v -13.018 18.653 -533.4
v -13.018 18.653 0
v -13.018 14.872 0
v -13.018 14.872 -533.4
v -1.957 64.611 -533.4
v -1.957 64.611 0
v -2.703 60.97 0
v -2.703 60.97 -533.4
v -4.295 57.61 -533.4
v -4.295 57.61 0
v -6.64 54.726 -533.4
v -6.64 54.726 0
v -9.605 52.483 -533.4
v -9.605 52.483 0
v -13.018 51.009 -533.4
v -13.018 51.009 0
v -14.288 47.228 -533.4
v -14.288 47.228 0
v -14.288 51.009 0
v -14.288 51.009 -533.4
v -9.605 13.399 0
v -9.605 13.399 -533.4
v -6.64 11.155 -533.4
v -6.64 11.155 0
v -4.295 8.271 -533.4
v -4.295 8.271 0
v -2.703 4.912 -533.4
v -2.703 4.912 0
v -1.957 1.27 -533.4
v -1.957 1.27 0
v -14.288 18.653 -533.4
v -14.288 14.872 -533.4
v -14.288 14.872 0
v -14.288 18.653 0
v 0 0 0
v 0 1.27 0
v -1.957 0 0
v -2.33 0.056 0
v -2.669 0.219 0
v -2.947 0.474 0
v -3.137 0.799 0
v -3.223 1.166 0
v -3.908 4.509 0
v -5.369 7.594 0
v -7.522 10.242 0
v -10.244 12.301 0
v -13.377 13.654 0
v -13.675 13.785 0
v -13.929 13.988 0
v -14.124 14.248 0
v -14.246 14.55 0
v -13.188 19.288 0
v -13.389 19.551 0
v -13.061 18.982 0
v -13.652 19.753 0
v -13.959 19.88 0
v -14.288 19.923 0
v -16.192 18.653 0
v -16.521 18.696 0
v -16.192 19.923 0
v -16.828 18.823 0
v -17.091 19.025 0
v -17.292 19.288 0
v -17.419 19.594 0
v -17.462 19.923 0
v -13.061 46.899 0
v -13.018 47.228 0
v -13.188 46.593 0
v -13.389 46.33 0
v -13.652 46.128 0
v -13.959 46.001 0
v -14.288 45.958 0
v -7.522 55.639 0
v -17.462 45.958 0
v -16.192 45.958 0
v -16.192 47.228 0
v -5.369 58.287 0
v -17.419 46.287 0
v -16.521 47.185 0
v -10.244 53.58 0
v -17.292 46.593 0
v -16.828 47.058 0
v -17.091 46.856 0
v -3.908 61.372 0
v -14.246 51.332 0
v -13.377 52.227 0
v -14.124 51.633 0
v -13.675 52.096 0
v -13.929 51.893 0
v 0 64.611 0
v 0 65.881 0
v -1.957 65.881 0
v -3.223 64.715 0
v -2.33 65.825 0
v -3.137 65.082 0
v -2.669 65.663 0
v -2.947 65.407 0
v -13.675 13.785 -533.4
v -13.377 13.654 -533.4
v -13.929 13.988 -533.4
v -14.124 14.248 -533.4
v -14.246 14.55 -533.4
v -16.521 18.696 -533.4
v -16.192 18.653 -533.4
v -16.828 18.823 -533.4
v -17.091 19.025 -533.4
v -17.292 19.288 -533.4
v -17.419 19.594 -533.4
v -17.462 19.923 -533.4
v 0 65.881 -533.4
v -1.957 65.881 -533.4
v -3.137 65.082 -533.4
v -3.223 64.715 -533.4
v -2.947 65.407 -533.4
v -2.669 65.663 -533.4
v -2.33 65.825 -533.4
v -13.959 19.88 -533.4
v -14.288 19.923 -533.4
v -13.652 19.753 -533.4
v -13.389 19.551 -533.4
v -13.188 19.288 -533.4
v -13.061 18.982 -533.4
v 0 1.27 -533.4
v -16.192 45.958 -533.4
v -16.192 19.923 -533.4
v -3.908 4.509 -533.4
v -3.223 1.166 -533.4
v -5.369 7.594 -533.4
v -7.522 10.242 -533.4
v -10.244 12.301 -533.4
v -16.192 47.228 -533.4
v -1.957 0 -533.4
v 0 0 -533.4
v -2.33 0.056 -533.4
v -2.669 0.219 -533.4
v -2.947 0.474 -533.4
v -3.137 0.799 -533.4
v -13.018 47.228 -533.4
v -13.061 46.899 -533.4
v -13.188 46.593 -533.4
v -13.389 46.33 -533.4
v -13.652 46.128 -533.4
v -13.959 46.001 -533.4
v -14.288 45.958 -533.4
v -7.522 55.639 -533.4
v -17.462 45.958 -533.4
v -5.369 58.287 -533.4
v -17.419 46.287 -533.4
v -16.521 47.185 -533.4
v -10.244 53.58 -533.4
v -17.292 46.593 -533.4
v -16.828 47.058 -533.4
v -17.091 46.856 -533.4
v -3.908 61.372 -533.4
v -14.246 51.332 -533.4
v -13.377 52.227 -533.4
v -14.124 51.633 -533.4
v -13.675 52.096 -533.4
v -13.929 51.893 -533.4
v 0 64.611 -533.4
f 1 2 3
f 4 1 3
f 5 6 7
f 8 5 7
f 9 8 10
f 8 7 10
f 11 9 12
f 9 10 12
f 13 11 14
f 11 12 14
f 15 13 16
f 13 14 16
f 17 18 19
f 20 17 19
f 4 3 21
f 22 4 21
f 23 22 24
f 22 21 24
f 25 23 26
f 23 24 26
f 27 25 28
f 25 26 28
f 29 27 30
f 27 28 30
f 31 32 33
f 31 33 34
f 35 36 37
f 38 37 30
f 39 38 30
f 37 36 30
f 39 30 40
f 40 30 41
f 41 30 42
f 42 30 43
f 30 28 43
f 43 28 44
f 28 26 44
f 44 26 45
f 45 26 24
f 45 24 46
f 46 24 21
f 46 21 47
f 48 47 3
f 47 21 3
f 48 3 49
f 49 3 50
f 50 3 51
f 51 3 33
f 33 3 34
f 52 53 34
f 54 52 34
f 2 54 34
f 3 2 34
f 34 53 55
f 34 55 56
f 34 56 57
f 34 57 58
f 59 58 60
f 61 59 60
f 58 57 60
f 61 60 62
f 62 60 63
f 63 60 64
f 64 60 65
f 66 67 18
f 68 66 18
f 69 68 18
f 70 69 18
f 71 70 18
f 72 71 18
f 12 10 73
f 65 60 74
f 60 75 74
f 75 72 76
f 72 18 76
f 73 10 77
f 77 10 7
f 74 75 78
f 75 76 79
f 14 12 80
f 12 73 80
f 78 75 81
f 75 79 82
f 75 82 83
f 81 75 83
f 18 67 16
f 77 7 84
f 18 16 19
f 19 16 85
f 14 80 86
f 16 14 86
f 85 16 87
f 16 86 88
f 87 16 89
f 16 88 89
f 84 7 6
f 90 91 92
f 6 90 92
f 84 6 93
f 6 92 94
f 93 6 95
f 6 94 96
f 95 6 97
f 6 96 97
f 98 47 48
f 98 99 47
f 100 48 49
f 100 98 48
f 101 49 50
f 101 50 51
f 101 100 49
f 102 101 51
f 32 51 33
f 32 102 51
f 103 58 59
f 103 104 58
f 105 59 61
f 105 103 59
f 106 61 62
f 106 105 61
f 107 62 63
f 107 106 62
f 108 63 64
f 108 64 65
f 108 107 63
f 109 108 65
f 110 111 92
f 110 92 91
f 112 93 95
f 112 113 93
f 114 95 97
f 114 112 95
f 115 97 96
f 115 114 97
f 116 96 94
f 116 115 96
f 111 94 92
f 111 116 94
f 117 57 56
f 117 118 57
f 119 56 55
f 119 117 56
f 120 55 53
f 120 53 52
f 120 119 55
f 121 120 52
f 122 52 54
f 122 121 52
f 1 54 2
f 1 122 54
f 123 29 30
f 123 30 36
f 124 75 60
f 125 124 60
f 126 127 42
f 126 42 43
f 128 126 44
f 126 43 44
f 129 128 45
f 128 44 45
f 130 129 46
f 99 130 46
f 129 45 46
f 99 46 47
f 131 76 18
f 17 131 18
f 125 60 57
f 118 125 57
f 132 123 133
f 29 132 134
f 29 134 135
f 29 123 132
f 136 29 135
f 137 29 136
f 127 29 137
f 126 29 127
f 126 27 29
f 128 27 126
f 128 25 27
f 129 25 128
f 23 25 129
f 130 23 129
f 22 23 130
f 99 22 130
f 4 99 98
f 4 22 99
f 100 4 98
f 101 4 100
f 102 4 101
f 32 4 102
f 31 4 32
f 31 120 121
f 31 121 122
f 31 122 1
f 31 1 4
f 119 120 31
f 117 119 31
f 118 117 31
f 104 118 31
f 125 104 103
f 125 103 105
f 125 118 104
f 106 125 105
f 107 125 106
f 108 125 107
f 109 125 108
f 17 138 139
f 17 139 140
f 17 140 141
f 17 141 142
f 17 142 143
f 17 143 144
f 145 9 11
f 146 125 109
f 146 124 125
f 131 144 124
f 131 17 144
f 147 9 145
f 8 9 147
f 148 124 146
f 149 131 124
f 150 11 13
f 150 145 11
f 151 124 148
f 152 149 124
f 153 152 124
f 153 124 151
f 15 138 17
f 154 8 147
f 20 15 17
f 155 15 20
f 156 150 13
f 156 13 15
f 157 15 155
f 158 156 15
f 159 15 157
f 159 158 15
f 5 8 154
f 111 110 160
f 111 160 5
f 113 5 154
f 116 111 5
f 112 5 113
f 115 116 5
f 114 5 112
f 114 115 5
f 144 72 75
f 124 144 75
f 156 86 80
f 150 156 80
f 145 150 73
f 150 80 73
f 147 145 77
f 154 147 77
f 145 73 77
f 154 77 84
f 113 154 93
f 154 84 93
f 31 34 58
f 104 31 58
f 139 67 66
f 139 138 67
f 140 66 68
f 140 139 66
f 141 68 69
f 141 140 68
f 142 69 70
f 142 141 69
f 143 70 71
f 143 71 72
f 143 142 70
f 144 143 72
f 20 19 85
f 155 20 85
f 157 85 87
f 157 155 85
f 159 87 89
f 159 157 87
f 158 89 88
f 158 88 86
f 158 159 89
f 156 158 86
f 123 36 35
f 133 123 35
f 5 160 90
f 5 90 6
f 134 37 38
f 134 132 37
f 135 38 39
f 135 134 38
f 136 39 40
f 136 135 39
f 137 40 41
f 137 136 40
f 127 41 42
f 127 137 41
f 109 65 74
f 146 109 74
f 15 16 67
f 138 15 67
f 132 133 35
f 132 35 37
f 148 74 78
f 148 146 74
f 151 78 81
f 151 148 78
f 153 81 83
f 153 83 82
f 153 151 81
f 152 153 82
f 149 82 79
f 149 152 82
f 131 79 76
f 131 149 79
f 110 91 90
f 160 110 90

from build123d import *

# Parameters (mm, degrees)
EXTRUDE_THIN1_DEPTH = 533.4
FILLET1_R           = 1.27


with BuildPart() as part:
    # Sketch1 → Extrude-Thin1 (new body)
    with BuildSketch(Plane.XY):
        with BuildLine():
            Line((0, 0), (-3.175, 0))
            ThreePointArc((-3.175, 0), (-6.294965924, 8.894339761), (-14.2875, 13.890625))
            Line((-14.2875, 13.890625), (-14.2875, 18.653125))
            Line((-14.2875, 18.653125), (-17.4625, 18.653125))
            Line((-17.4625, 18.653125), (-17.4625, 47.228125))
            Line((-17.4625, 47.228125), (-14.2875, 47.228125))
            Line((-14.2875, 47.228125), (-14.2875, 51.990625))
            ThreePointArc((-14.2875, 51.990625), (-6.294965924, 56.986910239), (-3.175, 65.88125))
            Line((-3.175, 65.88125), (0, 65.88125))
            Line((0, 65.88125), (0, 64.61125))
            Line((0, 64.61125), (-1.957090043, 64.61125))
            ThreePointArc((-1.957090043, 64.61125), (-5.380817599, 56.097391338), (-13.0175, 51.009289373))
            Line((-13.0175, 51.009289373), (-13.0175, 45.958125))
            Line((-13.0175, 45.958125), (-16.1925, 45.958125))
            Line((-16.1925, 45.958125), (-16.1925, 19.923125))
            Line((-16.1925, 19.923125), (-13.0175, 19.923125))
            Line((-13.0175, 19.923125), (-13.0175, 14.871960627))
            ThreePointArc((-13.0175, 14.871960627), (-5.380817599, 9.783858662), (-1.957090043, 1.27))
            Line((-1.957090043, 1.27), (0, 1.27))
            Line((0, 1.27), (0, 0))
        make_face()
    extrude(amount=-EXTRUDE_THIN1_DEPTH)

    # Fillet1
    fillet1_edges = [part.edges().sort_by_distance(p)[0] for p in [
        (-3.175, 0, -266.7),
        (-14.2875, 13.890625, -266.7),
        (-17.4625, 18.653125, -266.7),
        (-17.4625, 47.228125, -266.7),
        (-14.2875, 51.990625, -266.7),
        (-3.175, 65.88125, -266.7),
        (-13.0175, 45.958125, -266.7),
        (-13.0175, 19.923125, -266.7),
    ]]
    fillet(fillet1_edges, radius=FILLET1_R)


solid = part.part
